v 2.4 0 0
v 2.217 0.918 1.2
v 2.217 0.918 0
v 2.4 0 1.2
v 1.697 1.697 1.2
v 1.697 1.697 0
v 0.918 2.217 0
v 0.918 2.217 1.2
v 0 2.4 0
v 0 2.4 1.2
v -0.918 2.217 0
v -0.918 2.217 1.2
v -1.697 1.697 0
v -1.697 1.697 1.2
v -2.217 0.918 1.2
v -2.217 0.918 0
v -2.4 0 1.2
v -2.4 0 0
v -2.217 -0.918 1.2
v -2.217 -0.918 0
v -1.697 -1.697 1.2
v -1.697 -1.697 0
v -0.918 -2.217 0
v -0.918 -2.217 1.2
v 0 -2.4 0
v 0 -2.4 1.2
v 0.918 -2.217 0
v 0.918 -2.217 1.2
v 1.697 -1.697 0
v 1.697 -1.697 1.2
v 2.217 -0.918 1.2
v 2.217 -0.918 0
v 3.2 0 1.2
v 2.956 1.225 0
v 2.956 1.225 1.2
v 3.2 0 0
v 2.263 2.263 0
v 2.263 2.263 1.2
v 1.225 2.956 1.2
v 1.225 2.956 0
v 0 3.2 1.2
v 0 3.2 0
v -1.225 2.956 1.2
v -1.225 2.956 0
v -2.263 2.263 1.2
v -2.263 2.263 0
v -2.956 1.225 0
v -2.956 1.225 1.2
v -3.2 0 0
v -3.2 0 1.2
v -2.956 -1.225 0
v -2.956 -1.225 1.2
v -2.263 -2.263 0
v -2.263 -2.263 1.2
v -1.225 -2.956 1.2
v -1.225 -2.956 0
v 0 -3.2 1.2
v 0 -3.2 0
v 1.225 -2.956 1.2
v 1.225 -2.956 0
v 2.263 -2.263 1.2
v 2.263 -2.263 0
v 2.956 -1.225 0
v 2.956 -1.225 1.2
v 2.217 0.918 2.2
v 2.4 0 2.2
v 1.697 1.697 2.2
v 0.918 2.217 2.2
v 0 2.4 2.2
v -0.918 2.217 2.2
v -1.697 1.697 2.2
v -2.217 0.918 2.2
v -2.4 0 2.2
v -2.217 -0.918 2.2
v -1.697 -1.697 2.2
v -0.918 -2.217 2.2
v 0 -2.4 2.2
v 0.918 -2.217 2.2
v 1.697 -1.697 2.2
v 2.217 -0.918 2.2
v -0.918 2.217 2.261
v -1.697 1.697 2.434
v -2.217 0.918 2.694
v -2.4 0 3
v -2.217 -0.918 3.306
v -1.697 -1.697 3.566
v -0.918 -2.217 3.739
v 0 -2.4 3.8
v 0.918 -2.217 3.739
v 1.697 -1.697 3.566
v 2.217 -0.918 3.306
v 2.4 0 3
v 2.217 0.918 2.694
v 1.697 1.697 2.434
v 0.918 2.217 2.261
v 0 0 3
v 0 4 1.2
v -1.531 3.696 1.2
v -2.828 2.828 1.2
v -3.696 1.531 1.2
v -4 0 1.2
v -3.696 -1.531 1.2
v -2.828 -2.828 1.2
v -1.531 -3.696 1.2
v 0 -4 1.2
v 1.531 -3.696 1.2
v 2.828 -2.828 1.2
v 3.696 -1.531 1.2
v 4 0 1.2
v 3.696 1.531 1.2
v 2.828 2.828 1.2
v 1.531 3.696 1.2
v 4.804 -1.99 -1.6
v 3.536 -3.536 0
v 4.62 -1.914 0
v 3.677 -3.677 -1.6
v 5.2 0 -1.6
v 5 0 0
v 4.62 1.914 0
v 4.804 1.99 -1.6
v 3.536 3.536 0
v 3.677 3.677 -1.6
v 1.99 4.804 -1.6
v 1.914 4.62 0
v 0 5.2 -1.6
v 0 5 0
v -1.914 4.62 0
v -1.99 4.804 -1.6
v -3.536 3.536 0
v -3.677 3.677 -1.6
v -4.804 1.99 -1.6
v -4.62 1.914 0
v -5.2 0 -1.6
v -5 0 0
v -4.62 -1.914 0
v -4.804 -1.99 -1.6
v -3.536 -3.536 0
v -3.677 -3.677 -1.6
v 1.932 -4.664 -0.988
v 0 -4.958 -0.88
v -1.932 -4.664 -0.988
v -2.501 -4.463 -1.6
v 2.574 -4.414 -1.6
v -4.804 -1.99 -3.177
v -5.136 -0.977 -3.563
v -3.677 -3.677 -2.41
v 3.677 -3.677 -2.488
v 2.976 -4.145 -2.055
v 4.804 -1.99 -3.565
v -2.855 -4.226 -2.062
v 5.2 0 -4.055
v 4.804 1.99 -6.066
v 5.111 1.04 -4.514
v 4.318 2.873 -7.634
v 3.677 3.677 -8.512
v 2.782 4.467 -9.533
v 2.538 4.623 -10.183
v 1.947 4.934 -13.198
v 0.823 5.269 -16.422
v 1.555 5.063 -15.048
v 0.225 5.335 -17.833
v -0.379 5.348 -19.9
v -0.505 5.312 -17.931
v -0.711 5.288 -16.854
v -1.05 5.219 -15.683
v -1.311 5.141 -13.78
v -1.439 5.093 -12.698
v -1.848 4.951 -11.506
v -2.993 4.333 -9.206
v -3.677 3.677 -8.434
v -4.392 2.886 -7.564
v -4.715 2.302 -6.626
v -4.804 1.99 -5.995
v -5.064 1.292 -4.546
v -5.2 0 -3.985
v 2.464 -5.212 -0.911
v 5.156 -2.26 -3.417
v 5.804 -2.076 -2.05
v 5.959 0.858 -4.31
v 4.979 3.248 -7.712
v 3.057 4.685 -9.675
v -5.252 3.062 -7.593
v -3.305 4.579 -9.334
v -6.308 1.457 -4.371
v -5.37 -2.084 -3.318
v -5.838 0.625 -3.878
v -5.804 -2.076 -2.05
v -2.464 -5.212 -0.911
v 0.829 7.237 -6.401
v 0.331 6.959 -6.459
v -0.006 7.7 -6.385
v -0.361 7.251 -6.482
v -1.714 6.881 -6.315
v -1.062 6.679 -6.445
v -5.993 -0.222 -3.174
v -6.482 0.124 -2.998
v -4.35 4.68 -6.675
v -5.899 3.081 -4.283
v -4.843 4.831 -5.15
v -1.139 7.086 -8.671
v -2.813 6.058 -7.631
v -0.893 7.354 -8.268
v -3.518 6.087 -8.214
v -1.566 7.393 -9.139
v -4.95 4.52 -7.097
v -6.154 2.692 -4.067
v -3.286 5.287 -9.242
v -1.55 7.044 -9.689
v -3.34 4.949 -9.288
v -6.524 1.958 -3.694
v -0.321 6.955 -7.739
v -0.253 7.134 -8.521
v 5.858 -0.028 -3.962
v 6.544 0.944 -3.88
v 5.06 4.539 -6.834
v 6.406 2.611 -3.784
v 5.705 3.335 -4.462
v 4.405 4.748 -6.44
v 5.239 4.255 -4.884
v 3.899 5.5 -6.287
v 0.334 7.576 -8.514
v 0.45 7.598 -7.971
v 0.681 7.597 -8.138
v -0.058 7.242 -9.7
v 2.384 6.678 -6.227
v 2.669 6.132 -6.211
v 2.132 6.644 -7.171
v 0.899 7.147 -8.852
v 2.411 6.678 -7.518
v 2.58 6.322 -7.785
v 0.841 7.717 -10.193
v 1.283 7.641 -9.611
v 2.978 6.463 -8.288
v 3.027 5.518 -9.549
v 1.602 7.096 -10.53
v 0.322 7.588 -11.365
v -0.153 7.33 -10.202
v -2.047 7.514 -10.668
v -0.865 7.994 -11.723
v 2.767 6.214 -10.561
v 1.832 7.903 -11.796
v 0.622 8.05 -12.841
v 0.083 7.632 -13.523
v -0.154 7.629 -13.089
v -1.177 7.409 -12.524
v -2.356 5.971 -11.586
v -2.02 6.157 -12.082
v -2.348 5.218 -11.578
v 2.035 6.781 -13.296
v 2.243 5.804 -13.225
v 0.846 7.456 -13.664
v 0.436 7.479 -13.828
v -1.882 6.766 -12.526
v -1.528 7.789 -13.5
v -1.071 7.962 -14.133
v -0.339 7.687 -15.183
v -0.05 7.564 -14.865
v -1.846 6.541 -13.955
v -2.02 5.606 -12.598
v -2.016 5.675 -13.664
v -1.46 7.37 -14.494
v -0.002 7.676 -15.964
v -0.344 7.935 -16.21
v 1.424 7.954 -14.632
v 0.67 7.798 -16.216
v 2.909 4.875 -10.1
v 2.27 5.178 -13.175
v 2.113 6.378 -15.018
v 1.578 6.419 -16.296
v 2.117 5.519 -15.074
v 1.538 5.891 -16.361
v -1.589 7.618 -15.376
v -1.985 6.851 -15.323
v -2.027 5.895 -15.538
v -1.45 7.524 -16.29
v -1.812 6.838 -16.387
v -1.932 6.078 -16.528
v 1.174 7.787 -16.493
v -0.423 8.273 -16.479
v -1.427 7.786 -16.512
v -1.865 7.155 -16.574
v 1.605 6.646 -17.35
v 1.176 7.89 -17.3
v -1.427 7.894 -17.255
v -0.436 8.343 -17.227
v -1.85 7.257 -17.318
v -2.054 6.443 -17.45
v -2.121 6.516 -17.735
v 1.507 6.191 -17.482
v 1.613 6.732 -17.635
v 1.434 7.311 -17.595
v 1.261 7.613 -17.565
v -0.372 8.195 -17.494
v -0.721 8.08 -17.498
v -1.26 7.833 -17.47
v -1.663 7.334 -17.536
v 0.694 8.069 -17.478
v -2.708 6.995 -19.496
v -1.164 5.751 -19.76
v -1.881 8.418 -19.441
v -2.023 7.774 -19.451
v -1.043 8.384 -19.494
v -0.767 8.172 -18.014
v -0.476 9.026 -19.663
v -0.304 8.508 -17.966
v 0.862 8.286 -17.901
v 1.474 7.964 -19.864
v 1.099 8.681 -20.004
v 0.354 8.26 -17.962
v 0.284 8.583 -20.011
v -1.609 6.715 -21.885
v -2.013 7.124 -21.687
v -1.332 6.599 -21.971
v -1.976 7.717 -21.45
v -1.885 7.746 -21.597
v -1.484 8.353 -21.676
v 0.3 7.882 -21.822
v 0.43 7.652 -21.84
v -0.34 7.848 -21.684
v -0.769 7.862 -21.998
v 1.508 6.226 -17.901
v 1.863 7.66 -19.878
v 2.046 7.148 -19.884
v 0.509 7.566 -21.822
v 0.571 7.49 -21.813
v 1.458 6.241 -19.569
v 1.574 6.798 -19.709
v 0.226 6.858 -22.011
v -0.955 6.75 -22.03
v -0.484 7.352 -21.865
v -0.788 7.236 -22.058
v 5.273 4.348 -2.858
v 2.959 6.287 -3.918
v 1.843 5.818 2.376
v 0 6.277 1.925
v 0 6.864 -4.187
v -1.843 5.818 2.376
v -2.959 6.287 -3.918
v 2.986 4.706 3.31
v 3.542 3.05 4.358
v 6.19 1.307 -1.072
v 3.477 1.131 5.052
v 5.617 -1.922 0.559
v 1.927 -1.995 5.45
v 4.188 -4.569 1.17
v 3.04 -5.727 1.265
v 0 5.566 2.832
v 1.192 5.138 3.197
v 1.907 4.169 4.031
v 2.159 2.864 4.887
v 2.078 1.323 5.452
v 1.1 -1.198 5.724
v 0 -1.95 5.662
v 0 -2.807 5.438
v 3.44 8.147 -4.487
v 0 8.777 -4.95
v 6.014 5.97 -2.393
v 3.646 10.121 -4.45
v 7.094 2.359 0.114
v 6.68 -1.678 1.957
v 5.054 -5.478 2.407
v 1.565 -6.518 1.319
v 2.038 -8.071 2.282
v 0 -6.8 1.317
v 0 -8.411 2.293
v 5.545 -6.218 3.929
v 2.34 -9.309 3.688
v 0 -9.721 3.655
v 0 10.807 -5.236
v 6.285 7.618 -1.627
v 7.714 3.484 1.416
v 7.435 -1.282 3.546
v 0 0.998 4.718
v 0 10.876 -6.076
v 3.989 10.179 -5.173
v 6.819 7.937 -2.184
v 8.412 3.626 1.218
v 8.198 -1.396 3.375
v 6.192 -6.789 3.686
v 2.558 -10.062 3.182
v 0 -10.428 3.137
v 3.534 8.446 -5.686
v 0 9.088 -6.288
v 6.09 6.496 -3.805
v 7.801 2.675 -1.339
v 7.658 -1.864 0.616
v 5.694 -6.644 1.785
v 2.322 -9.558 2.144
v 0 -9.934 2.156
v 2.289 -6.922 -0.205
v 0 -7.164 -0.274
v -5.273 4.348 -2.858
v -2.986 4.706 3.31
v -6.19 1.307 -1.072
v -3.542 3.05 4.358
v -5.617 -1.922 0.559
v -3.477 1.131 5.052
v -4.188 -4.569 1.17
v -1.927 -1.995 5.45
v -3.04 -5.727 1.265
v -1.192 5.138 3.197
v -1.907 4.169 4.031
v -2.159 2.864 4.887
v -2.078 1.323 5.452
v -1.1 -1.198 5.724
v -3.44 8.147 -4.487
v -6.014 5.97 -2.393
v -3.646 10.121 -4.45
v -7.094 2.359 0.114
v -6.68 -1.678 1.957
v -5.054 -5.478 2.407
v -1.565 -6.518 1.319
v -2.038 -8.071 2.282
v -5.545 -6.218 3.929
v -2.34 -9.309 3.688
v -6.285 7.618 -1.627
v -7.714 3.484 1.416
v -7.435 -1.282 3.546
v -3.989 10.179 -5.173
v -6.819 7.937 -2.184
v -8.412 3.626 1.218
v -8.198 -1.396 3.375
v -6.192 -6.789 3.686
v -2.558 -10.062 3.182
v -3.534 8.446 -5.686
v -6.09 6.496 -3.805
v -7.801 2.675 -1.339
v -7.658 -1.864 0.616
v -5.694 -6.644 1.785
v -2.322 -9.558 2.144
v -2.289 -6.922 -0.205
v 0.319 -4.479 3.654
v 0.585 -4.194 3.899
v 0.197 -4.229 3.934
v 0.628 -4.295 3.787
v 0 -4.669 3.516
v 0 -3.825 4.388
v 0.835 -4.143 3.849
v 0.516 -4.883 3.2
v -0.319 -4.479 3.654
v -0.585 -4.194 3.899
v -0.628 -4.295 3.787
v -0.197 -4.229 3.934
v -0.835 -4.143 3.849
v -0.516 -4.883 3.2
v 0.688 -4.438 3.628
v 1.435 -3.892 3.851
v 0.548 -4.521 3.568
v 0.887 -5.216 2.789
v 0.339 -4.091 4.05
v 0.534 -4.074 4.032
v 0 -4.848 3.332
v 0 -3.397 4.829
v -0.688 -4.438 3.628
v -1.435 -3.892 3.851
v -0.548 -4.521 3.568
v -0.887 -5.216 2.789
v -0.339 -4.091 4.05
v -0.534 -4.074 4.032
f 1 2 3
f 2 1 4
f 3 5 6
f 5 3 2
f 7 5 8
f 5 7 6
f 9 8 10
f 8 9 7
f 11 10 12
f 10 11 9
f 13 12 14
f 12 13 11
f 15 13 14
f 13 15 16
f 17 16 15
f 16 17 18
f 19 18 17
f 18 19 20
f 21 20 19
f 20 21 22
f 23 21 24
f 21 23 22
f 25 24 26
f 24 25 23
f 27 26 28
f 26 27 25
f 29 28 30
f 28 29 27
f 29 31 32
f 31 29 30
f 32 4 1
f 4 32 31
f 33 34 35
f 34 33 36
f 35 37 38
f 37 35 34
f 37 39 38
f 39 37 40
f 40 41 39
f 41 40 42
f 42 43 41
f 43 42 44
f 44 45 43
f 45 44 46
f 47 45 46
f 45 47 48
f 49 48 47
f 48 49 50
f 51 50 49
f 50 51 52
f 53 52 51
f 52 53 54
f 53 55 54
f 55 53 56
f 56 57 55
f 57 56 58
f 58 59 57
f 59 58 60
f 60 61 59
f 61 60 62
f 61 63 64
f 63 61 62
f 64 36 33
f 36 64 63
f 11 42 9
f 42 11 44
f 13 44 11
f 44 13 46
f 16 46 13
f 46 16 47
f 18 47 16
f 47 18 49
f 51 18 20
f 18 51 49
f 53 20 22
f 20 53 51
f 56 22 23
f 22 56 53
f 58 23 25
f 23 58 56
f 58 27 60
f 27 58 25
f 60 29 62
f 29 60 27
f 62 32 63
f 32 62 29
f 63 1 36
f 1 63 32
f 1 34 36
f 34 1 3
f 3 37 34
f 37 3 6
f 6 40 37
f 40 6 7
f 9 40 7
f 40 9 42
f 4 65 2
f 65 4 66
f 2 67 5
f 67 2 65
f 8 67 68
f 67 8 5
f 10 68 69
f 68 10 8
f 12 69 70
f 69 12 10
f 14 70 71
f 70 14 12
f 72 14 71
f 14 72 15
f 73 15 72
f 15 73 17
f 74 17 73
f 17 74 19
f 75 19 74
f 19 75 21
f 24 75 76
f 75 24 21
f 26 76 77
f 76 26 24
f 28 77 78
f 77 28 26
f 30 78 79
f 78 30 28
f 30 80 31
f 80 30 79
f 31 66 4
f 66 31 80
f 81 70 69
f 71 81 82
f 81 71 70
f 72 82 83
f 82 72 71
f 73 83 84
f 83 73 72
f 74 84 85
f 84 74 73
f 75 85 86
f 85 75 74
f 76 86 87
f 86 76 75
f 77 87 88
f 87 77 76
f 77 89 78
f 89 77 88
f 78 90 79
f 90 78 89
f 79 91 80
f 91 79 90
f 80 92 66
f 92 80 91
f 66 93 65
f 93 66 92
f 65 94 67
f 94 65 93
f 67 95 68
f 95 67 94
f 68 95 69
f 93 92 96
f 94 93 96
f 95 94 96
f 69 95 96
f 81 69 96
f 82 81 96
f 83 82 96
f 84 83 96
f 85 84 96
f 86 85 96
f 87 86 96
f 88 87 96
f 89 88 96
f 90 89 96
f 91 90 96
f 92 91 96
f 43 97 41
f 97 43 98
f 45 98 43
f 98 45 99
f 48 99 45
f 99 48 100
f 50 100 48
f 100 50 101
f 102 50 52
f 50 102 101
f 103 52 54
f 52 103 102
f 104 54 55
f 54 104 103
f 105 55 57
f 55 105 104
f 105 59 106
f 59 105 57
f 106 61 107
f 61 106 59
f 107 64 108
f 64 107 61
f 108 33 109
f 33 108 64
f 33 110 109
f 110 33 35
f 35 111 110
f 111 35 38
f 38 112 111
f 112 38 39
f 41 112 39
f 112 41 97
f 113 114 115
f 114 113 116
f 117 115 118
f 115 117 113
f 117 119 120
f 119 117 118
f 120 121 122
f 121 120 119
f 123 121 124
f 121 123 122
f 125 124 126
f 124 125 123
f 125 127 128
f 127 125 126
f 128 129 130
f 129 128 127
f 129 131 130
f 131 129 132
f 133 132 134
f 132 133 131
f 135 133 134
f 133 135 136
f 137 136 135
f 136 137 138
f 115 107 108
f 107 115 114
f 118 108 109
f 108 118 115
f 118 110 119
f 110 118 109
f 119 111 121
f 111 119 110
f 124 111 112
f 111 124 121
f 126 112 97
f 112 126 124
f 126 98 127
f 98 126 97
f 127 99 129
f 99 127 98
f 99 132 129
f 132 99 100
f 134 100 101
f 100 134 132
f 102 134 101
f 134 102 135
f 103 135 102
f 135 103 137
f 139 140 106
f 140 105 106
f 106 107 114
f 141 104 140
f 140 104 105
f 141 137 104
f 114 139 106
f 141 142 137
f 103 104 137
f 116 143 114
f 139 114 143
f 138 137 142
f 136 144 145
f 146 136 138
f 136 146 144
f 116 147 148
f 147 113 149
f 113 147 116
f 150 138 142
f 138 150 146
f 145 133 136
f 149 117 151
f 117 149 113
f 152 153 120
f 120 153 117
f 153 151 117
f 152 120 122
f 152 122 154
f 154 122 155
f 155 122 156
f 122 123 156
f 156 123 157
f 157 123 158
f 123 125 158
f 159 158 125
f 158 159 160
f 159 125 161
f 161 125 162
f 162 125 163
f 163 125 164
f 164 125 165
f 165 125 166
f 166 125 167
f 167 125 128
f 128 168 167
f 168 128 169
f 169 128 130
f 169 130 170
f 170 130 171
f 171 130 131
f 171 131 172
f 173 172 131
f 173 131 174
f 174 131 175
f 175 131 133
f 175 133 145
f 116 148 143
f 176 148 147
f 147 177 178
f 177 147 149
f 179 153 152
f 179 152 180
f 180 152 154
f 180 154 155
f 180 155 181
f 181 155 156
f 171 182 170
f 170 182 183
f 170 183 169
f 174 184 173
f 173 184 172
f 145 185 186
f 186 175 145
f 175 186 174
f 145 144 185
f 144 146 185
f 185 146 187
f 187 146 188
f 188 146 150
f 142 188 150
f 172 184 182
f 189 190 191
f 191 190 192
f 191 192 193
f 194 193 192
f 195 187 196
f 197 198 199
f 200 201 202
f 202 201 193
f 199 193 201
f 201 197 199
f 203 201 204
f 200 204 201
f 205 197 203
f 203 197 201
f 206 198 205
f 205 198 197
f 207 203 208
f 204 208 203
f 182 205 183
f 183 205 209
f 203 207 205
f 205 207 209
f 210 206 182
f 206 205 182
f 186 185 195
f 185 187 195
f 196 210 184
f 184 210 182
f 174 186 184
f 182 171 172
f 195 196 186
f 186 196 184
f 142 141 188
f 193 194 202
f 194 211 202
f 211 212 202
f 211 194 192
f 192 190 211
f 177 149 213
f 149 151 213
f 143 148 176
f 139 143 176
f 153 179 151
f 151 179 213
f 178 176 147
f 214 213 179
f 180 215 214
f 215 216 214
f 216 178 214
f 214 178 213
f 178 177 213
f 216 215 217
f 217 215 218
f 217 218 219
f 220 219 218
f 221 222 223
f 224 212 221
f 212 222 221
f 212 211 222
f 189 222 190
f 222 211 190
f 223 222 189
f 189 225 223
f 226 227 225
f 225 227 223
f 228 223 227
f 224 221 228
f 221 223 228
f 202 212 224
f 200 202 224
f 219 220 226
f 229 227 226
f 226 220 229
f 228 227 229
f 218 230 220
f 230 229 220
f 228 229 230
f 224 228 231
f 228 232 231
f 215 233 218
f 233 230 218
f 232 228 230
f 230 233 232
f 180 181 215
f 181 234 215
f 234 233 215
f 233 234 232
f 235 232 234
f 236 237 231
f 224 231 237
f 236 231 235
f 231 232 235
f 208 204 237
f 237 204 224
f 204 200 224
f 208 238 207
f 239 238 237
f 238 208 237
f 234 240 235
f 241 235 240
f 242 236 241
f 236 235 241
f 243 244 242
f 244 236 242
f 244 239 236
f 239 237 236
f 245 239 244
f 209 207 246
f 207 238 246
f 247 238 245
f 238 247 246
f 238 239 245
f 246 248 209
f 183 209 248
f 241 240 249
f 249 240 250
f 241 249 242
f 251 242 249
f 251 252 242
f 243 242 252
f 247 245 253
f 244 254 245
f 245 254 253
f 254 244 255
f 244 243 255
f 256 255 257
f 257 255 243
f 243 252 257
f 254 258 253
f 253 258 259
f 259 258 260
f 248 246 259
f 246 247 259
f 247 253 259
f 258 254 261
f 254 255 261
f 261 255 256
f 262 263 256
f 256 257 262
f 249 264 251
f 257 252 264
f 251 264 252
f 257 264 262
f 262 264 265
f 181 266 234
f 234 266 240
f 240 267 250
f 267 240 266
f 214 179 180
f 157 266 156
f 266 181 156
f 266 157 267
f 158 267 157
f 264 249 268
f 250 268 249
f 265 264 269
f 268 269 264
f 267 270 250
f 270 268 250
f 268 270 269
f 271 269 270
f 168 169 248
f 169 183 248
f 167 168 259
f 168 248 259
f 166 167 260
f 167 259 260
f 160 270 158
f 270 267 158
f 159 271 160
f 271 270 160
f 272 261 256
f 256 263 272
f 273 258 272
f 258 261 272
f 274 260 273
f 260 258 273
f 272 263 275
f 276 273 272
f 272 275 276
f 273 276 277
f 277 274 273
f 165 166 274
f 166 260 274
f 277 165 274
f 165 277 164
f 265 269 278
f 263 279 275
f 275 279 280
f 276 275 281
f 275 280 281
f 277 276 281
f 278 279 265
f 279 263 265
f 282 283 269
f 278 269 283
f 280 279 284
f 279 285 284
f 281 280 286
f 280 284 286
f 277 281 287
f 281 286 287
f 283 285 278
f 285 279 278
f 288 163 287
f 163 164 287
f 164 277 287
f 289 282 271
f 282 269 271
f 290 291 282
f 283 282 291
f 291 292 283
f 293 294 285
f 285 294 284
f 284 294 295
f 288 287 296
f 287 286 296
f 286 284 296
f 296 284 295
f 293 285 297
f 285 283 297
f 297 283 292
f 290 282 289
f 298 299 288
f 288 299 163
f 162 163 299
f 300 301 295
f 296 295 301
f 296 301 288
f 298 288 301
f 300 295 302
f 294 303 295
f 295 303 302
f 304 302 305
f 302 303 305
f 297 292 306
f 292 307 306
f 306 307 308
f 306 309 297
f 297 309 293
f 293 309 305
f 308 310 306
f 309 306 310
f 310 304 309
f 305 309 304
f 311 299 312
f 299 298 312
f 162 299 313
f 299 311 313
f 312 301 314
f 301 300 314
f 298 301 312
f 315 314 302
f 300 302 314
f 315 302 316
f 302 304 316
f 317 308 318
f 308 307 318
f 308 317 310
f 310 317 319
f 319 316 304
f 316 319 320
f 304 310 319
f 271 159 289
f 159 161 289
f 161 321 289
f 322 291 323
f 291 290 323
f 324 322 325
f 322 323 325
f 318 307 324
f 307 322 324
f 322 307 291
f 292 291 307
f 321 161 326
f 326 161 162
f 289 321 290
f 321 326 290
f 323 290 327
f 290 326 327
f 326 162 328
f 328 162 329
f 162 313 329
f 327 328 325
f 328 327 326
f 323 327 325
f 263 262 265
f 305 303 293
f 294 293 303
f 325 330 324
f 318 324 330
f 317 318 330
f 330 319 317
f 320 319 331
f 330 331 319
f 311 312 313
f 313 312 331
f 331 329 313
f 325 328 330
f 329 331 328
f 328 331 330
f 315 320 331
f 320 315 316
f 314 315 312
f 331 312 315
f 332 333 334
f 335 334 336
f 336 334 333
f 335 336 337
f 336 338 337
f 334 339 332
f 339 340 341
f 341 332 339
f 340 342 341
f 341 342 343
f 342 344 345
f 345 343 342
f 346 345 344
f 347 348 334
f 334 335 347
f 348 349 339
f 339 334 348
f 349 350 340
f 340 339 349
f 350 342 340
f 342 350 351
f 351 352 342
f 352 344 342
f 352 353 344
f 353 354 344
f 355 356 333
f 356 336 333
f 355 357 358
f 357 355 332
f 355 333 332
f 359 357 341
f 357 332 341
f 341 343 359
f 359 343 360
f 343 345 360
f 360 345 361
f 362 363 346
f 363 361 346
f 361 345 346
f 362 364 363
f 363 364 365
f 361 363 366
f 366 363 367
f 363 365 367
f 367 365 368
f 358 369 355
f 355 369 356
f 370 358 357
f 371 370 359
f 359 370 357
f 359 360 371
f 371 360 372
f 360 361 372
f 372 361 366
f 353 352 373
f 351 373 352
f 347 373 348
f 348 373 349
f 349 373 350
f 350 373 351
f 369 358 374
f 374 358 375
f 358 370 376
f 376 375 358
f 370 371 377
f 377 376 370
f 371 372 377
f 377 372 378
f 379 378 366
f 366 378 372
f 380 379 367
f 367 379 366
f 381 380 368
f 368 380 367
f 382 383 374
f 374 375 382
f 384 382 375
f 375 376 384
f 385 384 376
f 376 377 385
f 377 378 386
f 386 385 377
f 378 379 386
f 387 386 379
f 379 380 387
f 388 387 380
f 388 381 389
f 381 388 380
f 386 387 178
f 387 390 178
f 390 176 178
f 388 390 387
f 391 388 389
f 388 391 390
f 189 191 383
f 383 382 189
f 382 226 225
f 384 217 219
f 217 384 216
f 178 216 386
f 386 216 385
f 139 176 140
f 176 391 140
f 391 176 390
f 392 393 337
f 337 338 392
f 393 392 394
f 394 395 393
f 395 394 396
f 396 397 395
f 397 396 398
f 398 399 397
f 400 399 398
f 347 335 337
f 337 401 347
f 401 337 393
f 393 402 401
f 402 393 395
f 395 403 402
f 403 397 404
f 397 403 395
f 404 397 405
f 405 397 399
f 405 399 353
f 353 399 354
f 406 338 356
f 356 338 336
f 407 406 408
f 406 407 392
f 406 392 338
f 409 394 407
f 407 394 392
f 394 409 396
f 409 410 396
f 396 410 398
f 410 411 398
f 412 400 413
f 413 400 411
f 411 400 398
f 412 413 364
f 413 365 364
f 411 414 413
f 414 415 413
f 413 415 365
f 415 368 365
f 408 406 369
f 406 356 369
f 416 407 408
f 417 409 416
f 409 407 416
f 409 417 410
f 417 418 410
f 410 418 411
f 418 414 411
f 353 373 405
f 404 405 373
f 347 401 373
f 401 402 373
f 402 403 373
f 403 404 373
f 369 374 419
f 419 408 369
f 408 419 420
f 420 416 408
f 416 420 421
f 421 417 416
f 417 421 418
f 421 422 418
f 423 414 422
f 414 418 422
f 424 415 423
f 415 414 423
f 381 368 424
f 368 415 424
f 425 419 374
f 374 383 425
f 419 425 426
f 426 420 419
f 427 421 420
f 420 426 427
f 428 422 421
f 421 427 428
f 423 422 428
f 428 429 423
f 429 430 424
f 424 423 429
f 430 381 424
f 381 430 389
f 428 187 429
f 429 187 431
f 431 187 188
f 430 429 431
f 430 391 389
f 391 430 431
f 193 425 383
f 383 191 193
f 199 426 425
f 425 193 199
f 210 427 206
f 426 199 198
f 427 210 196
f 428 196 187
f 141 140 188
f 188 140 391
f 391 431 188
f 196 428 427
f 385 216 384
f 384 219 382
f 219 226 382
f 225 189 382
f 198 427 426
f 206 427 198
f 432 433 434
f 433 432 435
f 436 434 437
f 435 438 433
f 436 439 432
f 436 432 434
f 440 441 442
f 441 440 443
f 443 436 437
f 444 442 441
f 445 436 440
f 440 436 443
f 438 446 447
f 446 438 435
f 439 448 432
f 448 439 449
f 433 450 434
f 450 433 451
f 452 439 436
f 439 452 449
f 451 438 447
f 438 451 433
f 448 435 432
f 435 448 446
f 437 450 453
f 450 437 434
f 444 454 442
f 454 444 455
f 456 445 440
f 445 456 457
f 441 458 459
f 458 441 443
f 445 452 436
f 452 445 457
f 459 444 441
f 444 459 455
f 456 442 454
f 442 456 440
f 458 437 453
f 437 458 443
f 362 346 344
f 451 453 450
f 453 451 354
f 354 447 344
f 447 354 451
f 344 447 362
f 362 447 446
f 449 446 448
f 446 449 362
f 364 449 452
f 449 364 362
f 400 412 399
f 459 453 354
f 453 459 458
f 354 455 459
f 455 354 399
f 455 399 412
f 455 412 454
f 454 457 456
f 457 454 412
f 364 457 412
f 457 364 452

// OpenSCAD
use <../lib.scad>
use <s/10168s01.scad>
use <s/10168s02.scad>
function ldraw_lib__10168p01() = [
// 0 Minifig Hat Cowboy with Medium Nougat Hair in Braid and Sheriff Star Pattern
// 0 Name: 10168p01.dat
// 0 Author: Lisa Winter [LisaWinter]
// 0 !LDRAW_ORG Part UPDATE 2024-08
// 0 !LICENSE Licensed under CC BY 4.0 : see CAreadme.txt
// 
// 0 BFC CERTIFY CCW
  [0,"BFC","CERTIFY"],
  [0,"BFC","CCW"],
// 
// 0 !CATEGORY Minifig Headwear
// 0 !KEYWORDS Bricklink 10168pb01, CMF, Collectible Minifigures, Cowgirl
// 0 !KEYWORDS Rebrickable 10168pr0001, Series 8, set 8833
// 
// 0 !HISTORY 2024-09-30 [OrionP] Official Update 2024-08
// 
// 0 // Hair
// 1 84 0 0 0 1 0 0 0 1 0 0 0 1 s\10168s01.dat
  [1,84,0,0,0,1,0,0,0,1,0,0,0,1, ldraw_lib__s__10168s01()],
// 0 // Hat
// 1 16 0 0 0 1 0 0 0 1 0 0 0 1 s\10168s02.dat
  [1,16,0,0,0,1,0,0,0,1,0,0,0,1, ldraw_lib__s__10168s02()],
// 
// 0 // Pattern
// 0 // Metallic Gold - 82
// 4 82 .797 -9.135 -11.197 1.569 -9.467 -10.737 1.462 -9.747 -10.484 .493 -9.835 -10.572
  [4,82,.797,-9.135,-11.197,1.569,-9.467,-10.737,1.462,-9.747,-10.484,.493,-9.835,-10.572],
// 3 82 0 -8.791 -11.673 .493 -9.835 -10.572 0 -10.969 -9.562
  [3,82,0,-8.791,-11.673,.493,-9.835,-10.572,0,-10.969,-9.562],
// 3 82 1.569 -9.467 -10.737 2.087 -9.622 -10.358 1.462 -9.747 -10.484
  [3,82,1.569,-9.467,-10.737,2.087,-9.622,-10.358,1.462,-9.747,-10.484],
// 3 82 0 -8.791 -11.673 1.29 -8.001 -12.207 .797 -9.135 -11.197
  [3,82,0,-8.791,-11.673,1.29,-8.001,-12.207,.797,-9.135,-11.197],
// 3 82 0 -8.791 -11.673 .797 -9.135 -11.197 .493 -9.835 -10.572
  [3,82,0,-8.791,-11.673,.797,-9.135,-11.197,.493,-9.835,-10.572],
// 4 82 -1.462 -9.747 -10.484 -1.569 -9.467 -10.737 -.797 -9.135 -11.197 -.493 -9.835 -10.572
  [4,82,-1.462,-9.747,-10.484,-1.569,-9.467,-10.737,-.797,-9.135,-11.197,-.493,-9.835,-10.572],
// 3 82 -.493 -9.835 -10.572 0 -8.791 -11.673 0 -10.969 -9.562
  [3,82,-.493,-9.835,-10.572,0,-8.791,-11.673,0,-10.969,-9.562],
// 3 82 -2.087 -9.622 -10.358 -1.569 -9.467 -10.737 -1.462 -9.747 -10.484
  [3,82,-2.087,-9.622,-10.358,-1.569,-9.467,-10.737,-1.462,-9.747,-10.484],
// 3 82 -1.29 -8.001 -12.207 0 -8.791 -11.673 -.797 -9.135 -11.197
  [3,82,-1.29,-8.001,-12.207,0,-8.791,-11.673,-.797,-9.135,-11.197],
// 3 82 -.797 -9.135 -11.197 0 -8.791 -11.673 -.493 -9.835 -10.572
  [3,82,-.797,-9.135,-11.197,0,-8.791,-11.673,-.493,-9.835,-10.572],
// 
// 0 // Metallic Silver - 80
// 4 80 1.719 -9.071 -11.094 3.587 -9.627 -9.731 2.087 -9.622 -10.358 1.569 -9.467 -10.737
  [4,80,1.719,-9.071,-11.094,3.587,-9.627,-9.731,2.087,-9.622,-10.358,1.569,-9.467,-10.737],
// 4 80 1.371 -8.921 -11.302 .797 -9.135 -11.197 1.29 -8.001 -12.207 2.218 -6.972 -13.039
  [4,80,1.371,-8.921,-11.302,.797,-9.135,-11.197,1.29,-8.001,-12.207,2.218,-6.972,-13.039],
// 4 80 1.462 -9.747 -10.484 1.336 -10.08 -10.184 .847 -10.125 -10.228 .493 -9.835 -10.572
  [4,80,1.462,-9.747,-10.484,1.336,-10.08,-10.184,.847,-10.125,-10.228,.493,-9.835,-10.572],
// 4 80 1.29 -8.001 -12.207 0 -8.791 -11.673 0 -8.33 -12.119 2.218 -6.972 -13.039
  [4,80,1.29,-8.001,-12.207,0,-8.791,-11.673,0,-8.33,-12.119,2.218,-6.972,-13.039],
// 4 80 1.336 -10.08 -10.184 1.462 -9.747 -10.484 2.087 -9.622 -10.358 3.587 -9.627 -9.731
  [4,80,1.336,-10.08,-10.184,1.462,-9.747,-10.484,2.087,-9.622,-10.358,3.587,-9.627,-9.731],
// 4 80 1.569 -9.467 -10.737 .797 -9.135 -11.197 1.371 -8.921 -11.302 1.719 -9.071 -11.094
  [4,80,1.569,-9.467,-10.737,.797,-9.135,-11.197,1.371,-8.921,-11.302,1.719,-9.071,-11.094],
// 4 80 0 -12.073 -8.492 0 -10.969 -9.562 .493 -9.835 -10.572 .847 -10.125 -10.228
  [4,80,0,-12.073,-8.492,0,-10.969,-9.562,.493,-9.835,-10.572,.847,-10.125,-10.228],
// 4 80 -2.087 -9.622 -10.358 -3.587 -9.627 -9.731 -1.719 -9.071 -11.094 -1.569 -9.467 -10.737
  [4,80,-2.087,-9.622,-10.358,-3.587,-9.627,-9.731,-1.719,-9.071,-11.094,-1.569,-9.467,-10.737],
// 4 80 -1.29 -8.001 -12.207 -.797 -9.135 -11.197 -1.371 -8.921 -11.302 -2.218 -6.972 -13.039
  [4,80,-1.29,-8.001,-12.207,-.797,-9.135,-11.197,-1.371,-8.921,-11.302,-2.218,-6.972,-13.039],
// 4 80 -.847 -10.125 -10.228 -1.336 -10.08 -10.184 -1.462 -9.747 -10.484 -.493 -9.835 -10.572
  [4,80,-.847,-10.125,-10.228,-1.336,-10.08,-10.184,-1.462,-9.747,-10.484,-.493,-9.835,-10.572],
// 4 80 0 -8.33 -12.119 0 -8.791 -11.673 -1.29 -8.001 -12.207 -2.218 -6.972 -13.039
  [4,80,0,-8.33,-12.119,0,-8.791,-11.673,-1.29,-8.001,-12.207,-2.218,-6.972,-13.039],
// 4 80 -2.087 -9.622 -10.358 -1.462 -9.747 -10.484 -1.336 -10.08 -10.184 -3.587 -9.627 -9.731
  [4,80,-2.087,-9.622,-10.358,-1.462,-9.747,-10.484,-1.336,-10.08,-10.184,-3.587,-9.627,-9.731],
// 4 80 -1.371 -8.921 -11.302 -.797 -9.135 -11.197 -1.569 -9.467 -10.737 -1.719 -9.071 -11.094
  [4,80,-1.371,-8.921,-11.302,-.797,-9.135,-11.197,-1.569,-9.467,-10.737,-1.719,-9.071,-11.094],
// 4 80 -.493 -9.835 -10.572 0 -10.969 -9.562 0 -12.073 -8.492 -.847 -10.125 -10.228
  [4,80,-.493,-9.835,-10.572,0,-10.969,-9.562,0,-12.073,-8.492,-.847,-10.125,-10.228],
// 
// 0 // Color 16
// 3 16 3.913 -3.298 -16.296 7.599 -3.162 -14.318 4.817 -13.626 -4.988
  [3,16,3.913,-3.298,-16.296,7.599,-3.162,-14.318,4.817,-13.626,-4.988],
// 4 16 0 -12.073 -8.492 .847 -10.125 -10.228 1.336 -10.08 -10.184 0 -13.595 -7.017
  [4,16,0,-12.073,-8.492,.847,-10.125,-10.228,1.336,-10.08,-10.184,0,-13.595,-7.017],
// 4 16 4.817 -13.626 -4.988 0 -13.595 -7.017 1.336 -10.08 -10.184 3.587 -9.627 -9.731
  [4,16,4.817,-13.626,-4.988,0,-13.595,-7.017,1.336,-10.08,-10.184,3.587,-9.627,-9.731],
// 3 16 4.817 -13.626 -4.988 3.587 -9.627 -9.731 3.913 -3.298 -16.296
  [3,16,4.817,-13.626,-4.988,3.587,-9.627,-9.731,3.913,-3.298,-16.296],
// 3 16 3.913 -3.298 -16.296 3.587 -9.627 -9.731 1.719 -9.071 -11.094
  [3,16,3.913,-3.298,-16.296,3.587,-9.627,-9.731,1.719,-9.071,-11.094],
// 4 16 3.913 -3.298 -16.296 1.719 -9.071 -11.094 1.371 -8.921 -11.302 2.218 -6.972 -13.039
  [4,16,3.913,-3.298,-16.296,1.719,-9.071,-11.094,1.371,-8.921,-11.302,2.218,-6.972,-13.039],
// 4 16 3.913 -3.298 -16.296 2.218 -6.972 -13.039 0 -8.33 -12.119 0 -3.292 -17.001
  [4,16,3.913,-3.298,-16.296,2.218,-6.972,-13.039,0,-8.33,-12.119,0,-3.292,-17.001],
// 3 16 -7.599 -3.162 -14.318 -3.913 -3.298 -16.296 -4.817 -13.626 -4.988
  [3,16,-7.599,-3.162,-14.318,-3.913,-3.298,-16.296,-4.817,-13.626,-4.988],
// 4 16 0 -12.073 -8.492 0 -13.595 -7.017 -1.336 -10.08 -10.184 -.847 -10.125 -10.228
  [4,16,0,-12.073,-8.492,0,-13.595,-7.017,-1.336,-10.08,-10.184,-.847,-10.125,-10.228],
// 4 16 -1.336 -10.08 -10.184 0 -13.595 -7.017 -4.817 -13.626 -4.988 -3.587 -9.627 -9.731
  [4,16,-1.336,-10.08,-10.184,0,-13.595,-7.017,-4.817,-13.626,-4.988,-3.587,-9.627,-9.731],
// 3 16 -3.587 -9.627 -9.731 -4.817 -13.626 -4.988 -3.913 -3.298 -16.296
  [3,16,-3.587,-9.627,-9.731,-4.817,-13.626,-4.988,-3.913,-3.298,-16.296],
// 3 16 -3.587 -9.627 -9.731 -3.913 -3.298 -16.296 -1.719 -9.071 -11.094
  [3,16,-3.587,-9.627,-9.731,-3.913,-3.298,-16.296,-1.719,-9.071,-11.094],
// 4 16 -3.913 -3.298 -16.296 -2.218 -6.972 -13.039 -1.371 -8.921 -11.302 -1.719 -9.071 -11.094
  [4,16,-3.913,-3.298,-16.296,-2.218,-6.972,-13.039,-1.371,-8.921,-11.302,-1.719,-9.071,-11.094],
// 4 16 0 -8.33 -12.119 -2.218 -6.972 -13.039 -3.913 -3.298 -16.296 0 -3.292 -17.001
  [4,16,0,-8.33,-12.119,-2.218,-6.972,-13.039,-3.913,-3.298,-16.296,0,-3.292,-17.001],
// 
// 5 24 4.817 -13.626 -4.988 3.913 -3.298 -16.296 0 -13.595 -7.017 7.599 -3.162 -14.318
  [5,24,4.817,-13.626,-4.988,3.913,-3.298,-16.296,0,-13.595,-7.017,7.599,-3.162,-14.318],
// 5 24 -3.913 -3.298 -16.296 0 -13.595 -7.017 0 -3.292 -17.001 -4.817 -13.626 -4.988
  [5,24,-3.913,-3.298,-16.296,0,-13.595,-7.017,0,-3.292,-17.001,-4.817,-13.626,-4.988],
// 5 24 0 -13.595 -7.017 0 -3.292 -17.001 -3.913 -3.298 -16.296 3.913 -3.298 -16.296
  [5,24,0,-13.595,-7.017,0,-3.292,-17.001,-3.913,-3.298,-16.296,3.913,-3.298,-16.296],
// 5 24 3.913 -3.298 -16.296 0 -13.595 -7.017 0 -3.292 -17.001 4.817 -13.626 -4.988
  [5,24,3.913,-3.298,-16.296,0,-13.595,-7.017,0,-3.292,-17.001,4.817,-13.626,-4.988],
// 5 24 -4.817 -13.626 -4.988 -3.913 -3.298 -16.296 -7.599 -3.162 -14.318 0 -13.595 -7.017
  [5,24,-4.817,-13.626,-4.988,-3.913,-3.298,-16.296,-7.599,-3.162,-14.318,0,-13.595,-7.017],
];
module ldraw_lib__10168p01(step=0, col=false, unit=2/5, alt=false, line=0.2, solid=!$preview)
    makepoly(ldraw_lib__10168p01(), step=step, col=col, unit=unit, alt=alt, line=line, solid=solid);
ldraw_lib__10168p01(line=0.2);
